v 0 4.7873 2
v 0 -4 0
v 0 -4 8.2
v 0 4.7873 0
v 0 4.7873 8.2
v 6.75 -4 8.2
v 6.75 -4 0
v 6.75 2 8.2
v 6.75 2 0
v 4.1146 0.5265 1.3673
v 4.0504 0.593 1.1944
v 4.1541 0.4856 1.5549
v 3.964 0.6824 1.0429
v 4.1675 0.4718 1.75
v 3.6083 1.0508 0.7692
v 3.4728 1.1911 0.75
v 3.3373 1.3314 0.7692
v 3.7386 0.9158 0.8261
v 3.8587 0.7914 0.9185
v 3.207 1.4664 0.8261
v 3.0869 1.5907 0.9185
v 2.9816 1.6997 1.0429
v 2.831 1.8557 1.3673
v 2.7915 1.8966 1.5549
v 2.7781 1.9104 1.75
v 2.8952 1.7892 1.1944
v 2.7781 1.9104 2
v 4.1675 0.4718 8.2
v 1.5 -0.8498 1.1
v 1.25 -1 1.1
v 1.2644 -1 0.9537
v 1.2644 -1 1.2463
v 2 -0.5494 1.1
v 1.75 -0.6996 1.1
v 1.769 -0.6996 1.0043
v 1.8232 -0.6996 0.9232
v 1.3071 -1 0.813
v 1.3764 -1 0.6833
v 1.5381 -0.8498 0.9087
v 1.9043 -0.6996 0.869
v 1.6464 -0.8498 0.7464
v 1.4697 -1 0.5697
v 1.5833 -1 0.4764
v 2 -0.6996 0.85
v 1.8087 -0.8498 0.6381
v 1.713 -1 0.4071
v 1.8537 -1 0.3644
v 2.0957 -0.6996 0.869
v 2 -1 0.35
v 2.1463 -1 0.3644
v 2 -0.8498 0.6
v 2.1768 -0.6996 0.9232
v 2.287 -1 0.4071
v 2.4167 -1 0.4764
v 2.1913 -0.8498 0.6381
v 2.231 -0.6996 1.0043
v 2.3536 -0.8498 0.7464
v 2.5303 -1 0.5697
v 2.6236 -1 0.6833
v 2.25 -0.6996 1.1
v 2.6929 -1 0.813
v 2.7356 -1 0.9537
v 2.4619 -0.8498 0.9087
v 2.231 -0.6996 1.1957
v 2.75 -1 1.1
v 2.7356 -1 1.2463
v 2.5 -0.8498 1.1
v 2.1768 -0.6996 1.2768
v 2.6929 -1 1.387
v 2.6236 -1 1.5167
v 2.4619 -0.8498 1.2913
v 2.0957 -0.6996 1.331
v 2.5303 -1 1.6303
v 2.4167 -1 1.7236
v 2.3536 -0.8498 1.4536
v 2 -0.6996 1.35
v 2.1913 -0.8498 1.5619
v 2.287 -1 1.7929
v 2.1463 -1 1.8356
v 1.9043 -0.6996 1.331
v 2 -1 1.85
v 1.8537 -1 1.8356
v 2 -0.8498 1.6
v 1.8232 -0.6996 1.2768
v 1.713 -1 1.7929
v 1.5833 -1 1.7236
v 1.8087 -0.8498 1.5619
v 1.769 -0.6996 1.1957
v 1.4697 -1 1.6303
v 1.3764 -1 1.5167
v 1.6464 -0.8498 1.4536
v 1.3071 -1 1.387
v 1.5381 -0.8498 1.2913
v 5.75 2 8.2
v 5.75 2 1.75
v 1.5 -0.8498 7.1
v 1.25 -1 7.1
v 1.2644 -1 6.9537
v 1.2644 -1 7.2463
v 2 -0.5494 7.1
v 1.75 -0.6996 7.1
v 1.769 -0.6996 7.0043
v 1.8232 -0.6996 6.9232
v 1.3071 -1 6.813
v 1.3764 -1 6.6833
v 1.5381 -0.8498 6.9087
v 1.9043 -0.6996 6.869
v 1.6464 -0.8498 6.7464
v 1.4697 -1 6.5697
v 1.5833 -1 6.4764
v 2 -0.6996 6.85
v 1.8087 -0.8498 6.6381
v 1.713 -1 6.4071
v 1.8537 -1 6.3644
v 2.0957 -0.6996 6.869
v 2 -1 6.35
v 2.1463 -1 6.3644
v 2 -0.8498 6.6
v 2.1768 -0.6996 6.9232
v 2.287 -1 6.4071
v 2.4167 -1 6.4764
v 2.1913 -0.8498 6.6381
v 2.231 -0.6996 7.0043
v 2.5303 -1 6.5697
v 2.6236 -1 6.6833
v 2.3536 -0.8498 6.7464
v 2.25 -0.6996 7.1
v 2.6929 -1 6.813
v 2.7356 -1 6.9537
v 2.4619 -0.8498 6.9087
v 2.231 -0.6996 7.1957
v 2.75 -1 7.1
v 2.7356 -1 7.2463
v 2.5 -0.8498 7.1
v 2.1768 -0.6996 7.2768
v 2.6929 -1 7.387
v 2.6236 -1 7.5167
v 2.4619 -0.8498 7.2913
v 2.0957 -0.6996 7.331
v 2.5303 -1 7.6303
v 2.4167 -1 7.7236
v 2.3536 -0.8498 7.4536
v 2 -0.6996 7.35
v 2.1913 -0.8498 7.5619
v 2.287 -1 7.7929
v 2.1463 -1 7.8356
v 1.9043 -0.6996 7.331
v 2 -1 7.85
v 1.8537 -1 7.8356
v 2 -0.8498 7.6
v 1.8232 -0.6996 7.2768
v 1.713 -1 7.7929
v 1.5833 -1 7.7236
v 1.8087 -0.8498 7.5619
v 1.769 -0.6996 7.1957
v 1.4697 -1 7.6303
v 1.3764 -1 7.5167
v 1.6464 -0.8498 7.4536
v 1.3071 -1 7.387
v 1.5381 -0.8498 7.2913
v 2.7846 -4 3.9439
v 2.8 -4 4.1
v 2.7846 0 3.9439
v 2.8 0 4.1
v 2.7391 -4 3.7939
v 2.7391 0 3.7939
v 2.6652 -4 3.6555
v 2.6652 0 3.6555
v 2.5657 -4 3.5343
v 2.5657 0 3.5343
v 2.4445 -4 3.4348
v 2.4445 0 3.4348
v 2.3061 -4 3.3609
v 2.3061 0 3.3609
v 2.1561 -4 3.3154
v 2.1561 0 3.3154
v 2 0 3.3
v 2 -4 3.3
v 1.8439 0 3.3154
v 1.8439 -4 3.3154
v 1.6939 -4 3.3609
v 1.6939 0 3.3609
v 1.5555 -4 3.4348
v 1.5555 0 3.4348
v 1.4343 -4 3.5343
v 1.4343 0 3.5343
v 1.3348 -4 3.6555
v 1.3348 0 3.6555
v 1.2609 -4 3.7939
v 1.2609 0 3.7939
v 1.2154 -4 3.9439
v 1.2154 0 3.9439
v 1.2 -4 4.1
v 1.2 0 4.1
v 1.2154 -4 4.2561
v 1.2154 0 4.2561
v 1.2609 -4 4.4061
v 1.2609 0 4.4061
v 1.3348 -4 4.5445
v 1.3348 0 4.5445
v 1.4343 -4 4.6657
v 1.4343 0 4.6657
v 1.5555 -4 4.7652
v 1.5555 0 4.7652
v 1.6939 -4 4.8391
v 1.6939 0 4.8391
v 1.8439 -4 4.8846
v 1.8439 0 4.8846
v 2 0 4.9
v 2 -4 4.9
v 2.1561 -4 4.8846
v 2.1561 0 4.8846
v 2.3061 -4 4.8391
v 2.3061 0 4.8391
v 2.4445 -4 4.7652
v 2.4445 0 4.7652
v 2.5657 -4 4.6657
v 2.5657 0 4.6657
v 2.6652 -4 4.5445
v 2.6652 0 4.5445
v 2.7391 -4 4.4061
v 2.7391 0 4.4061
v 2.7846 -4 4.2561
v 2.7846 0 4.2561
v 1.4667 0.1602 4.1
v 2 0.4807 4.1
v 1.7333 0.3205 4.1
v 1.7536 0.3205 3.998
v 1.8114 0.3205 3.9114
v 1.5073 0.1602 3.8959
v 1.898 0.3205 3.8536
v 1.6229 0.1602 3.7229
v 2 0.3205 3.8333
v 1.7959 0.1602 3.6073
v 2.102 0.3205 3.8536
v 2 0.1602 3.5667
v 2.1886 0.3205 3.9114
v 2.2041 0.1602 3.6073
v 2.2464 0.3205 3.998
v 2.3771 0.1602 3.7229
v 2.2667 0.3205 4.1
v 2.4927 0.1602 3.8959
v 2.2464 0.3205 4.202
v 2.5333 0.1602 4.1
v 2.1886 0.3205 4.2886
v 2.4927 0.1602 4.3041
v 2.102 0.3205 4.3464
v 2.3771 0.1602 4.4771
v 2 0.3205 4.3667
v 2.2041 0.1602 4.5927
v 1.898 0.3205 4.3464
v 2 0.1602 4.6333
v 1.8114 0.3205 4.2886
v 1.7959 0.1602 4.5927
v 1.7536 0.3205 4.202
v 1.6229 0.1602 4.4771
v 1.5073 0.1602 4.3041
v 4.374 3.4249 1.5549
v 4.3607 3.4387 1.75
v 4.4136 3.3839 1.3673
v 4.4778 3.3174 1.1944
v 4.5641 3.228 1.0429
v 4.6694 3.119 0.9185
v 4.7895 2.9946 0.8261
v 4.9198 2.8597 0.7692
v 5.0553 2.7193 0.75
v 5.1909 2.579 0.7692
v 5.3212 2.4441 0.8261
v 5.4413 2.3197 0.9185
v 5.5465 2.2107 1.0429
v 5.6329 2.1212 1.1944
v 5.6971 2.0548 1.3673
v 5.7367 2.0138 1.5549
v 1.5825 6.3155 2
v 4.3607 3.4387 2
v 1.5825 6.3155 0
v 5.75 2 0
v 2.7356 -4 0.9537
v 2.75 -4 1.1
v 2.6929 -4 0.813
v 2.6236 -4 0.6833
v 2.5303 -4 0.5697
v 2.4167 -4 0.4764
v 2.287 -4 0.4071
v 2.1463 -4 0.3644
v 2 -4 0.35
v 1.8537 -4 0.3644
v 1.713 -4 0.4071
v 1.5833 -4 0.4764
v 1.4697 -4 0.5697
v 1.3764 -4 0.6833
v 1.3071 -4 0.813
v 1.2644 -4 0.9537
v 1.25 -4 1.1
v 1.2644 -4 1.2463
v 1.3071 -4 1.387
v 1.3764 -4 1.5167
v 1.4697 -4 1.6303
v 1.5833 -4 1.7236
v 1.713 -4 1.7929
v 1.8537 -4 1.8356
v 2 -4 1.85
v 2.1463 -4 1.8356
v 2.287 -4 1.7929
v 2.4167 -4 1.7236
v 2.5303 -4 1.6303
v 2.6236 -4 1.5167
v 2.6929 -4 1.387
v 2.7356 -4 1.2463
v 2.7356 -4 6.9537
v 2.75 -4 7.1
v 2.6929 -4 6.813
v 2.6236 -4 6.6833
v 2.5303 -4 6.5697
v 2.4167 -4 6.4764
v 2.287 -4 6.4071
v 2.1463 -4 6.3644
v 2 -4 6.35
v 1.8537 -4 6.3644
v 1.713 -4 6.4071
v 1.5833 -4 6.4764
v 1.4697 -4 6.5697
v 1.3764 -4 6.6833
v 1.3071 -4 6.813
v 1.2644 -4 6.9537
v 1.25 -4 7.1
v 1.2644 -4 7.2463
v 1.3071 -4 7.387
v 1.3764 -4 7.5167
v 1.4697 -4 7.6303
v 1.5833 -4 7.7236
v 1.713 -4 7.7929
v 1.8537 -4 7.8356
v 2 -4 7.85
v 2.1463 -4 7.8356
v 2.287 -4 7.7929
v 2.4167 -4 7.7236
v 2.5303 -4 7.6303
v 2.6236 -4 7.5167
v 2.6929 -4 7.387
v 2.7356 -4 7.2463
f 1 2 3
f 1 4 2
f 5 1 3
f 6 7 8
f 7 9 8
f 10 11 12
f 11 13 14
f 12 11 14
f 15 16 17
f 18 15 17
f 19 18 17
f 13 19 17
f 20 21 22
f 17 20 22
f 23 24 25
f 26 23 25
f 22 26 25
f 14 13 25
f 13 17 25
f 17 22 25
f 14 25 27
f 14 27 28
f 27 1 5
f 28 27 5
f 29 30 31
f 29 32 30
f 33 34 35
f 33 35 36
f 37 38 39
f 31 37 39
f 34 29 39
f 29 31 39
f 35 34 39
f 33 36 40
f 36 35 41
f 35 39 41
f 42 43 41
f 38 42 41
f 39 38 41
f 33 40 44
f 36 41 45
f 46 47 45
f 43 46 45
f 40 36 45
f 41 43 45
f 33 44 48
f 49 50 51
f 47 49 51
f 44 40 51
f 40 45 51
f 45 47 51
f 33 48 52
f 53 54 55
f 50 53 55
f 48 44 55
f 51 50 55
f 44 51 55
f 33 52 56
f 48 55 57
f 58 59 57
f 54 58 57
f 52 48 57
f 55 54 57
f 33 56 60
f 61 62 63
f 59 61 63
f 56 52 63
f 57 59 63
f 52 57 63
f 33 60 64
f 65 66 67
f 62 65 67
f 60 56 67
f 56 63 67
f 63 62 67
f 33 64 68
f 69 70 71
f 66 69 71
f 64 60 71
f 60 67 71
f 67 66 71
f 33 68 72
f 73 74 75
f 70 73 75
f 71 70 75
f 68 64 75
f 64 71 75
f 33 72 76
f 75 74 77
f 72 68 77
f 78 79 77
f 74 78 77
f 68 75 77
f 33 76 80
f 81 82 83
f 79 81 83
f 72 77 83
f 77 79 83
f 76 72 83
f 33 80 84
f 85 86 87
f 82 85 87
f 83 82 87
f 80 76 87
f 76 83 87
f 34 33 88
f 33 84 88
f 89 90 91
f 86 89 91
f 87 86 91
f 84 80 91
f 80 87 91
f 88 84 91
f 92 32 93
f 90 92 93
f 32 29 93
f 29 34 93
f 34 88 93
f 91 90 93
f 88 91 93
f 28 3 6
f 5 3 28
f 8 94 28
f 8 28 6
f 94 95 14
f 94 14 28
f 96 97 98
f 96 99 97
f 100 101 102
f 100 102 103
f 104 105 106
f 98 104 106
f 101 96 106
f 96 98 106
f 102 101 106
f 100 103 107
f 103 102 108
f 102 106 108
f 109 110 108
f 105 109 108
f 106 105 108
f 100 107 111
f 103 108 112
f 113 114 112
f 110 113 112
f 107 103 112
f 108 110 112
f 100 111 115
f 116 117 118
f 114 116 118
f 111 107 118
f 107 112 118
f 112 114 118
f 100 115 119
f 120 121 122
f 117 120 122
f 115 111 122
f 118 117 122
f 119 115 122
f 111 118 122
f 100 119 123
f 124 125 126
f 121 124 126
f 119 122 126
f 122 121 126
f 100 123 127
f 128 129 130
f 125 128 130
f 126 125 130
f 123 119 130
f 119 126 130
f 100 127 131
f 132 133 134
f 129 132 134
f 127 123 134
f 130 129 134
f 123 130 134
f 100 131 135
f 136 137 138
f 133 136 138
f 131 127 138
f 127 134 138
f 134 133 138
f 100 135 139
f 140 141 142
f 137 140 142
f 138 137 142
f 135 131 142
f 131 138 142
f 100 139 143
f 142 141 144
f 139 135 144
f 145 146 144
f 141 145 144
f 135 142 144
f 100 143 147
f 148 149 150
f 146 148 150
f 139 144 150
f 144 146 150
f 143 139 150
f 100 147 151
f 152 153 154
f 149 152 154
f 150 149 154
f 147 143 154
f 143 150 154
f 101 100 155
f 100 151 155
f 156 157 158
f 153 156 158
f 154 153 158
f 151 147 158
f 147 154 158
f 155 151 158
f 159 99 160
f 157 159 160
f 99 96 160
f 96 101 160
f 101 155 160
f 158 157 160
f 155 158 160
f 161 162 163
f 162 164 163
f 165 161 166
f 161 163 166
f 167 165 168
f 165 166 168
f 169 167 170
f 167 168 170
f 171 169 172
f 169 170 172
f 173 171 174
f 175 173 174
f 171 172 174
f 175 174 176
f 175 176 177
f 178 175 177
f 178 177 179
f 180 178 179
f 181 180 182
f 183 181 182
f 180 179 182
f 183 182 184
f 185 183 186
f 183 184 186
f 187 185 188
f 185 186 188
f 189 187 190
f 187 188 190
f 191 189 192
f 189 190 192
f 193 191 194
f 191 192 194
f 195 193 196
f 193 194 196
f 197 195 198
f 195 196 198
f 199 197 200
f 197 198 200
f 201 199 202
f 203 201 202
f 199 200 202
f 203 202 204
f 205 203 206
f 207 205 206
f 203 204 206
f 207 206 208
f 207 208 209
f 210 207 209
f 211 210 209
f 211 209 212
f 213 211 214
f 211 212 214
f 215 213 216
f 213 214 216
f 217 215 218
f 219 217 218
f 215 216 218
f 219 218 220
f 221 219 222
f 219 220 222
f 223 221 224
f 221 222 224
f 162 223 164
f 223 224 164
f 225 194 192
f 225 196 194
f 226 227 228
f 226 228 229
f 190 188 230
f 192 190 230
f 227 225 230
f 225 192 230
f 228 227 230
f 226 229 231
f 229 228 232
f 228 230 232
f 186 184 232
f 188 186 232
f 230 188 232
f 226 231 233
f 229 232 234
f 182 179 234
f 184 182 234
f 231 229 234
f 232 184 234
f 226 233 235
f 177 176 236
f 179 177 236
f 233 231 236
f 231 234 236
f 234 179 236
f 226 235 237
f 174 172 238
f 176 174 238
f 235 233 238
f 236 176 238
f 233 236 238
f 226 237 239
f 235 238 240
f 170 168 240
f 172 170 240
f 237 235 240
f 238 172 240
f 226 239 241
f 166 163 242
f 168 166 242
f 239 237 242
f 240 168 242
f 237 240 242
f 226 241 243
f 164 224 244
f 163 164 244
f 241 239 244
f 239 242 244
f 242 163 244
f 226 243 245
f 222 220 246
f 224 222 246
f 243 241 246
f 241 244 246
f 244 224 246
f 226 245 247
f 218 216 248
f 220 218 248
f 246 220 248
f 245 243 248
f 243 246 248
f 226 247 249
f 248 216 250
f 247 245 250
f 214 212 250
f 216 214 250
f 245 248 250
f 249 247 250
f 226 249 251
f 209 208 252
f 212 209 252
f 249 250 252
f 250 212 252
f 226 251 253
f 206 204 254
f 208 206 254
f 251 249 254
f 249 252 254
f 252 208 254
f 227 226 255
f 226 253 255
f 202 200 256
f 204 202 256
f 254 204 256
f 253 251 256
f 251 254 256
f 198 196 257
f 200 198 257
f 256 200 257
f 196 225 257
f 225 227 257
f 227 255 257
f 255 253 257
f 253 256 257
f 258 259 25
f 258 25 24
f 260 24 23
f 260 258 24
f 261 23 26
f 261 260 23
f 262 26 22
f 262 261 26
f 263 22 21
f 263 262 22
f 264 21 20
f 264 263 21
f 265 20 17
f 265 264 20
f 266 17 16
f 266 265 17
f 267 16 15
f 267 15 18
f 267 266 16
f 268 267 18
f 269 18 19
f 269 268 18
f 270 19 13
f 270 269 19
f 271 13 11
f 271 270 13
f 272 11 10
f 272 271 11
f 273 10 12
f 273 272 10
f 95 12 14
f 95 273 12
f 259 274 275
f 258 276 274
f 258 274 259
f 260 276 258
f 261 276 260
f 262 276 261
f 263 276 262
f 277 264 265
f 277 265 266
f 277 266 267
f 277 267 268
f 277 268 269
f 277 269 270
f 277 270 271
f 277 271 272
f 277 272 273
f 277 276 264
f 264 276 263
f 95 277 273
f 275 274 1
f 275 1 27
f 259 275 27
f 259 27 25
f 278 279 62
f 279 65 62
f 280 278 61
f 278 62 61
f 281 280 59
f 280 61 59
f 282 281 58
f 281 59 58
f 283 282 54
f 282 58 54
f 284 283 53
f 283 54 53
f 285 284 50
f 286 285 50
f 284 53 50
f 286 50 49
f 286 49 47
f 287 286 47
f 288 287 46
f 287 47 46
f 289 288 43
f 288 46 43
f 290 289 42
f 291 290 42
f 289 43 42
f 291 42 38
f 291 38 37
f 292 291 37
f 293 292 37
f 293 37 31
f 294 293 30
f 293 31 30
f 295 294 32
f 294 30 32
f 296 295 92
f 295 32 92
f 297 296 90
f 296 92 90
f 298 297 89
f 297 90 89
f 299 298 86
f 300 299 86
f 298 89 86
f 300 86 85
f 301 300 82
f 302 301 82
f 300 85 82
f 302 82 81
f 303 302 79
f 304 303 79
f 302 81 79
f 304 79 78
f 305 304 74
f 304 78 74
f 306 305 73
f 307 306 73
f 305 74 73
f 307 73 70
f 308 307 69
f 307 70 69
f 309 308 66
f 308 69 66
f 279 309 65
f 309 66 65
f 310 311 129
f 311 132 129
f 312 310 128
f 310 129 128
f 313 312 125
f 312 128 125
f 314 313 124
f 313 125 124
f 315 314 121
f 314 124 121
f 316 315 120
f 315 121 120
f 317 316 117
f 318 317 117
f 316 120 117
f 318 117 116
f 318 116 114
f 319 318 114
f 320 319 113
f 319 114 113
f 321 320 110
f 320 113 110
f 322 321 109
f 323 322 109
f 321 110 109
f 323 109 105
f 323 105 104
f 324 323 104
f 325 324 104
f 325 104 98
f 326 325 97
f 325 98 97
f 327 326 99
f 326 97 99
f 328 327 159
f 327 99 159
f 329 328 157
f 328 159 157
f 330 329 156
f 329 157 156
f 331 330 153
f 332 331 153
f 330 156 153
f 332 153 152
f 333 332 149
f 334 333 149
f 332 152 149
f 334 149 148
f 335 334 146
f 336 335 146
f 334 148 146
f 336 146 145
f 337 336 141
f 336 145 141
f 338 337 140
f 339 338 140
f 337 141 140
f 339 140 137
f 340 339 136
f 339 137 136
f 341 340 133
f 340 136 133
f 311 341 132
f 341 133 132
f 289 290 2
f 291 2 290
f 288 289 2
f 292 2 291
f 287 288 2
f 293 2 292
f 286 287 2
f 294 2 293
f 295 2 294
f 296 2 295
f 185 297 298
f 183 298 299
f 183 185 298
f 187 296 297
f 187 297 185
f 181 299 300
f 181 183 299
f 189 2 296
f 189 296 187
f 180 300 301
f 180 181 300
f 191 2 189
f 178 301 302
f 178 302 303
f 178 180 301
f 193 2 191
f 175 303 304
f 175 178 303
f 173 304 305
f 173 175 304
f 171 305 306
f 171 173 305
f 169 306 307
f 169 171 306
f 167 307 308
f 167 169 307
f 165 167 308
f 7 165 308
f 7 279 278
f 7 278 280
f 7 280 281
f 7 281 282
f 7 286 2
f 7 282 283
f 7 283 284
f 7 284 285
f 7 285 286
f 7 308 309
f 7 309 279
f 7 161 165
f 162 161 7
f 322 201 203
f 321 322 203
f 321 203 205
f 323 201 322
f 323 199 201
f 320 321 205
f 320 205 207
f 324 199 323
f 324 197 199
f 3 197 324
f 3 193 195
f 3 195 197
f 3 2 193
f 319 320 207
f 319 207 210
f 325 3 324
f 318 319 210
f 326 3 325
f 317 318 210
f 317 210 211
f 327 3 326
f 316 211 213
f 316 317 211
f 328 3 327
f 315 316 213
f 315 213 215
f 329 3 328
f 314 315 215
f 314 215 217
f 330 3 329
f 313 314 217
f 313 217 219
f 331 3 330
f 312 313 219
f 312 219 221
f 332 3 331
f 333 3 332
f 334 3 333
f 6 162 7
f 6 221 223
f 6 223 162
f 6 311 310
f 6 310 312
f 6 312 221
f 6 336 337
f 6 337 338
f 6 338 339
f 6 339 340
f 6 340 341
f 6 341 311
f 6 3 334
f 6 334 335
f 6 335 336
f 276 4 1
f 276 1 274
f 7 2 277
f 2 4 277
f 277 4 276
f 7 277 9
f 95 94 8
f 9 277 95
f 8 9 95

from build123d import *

# Parameters (mm, degrees)
BOSS_EXTRUDE1_DEPTH       = 8.2
CUT_EXTRUDE1_DEPTH        = 2.2
SKETCH3_W                 = 6.75
SKETCH3_H                 = 8.2
BOSS_EXTRUDE2_DEPTH       = 4
F_1_5MM_DOWEL_HOLE1_D     = 1.5
F_1_5MM_DOWEL_HOLE1_DEPTH = 3
F_1_5MM_DOWEL_HOLE1_TIP   = 0.450645464
M2X0_4_TAPPED_HOLE1_D     = 1.6
M2X0_4_TAPPED_HOLE1_DEPTH = 4
M2X0_4_TAPPED_HOLE1_TIP   = 0.480688495


with BuildPart() as part:
    # Sketch1 → Boss-Extrude1 (new body)
    with BuildSketch(Plane.XY):
        Polygon((0, 0), (0, 4.787274917), (1.582547561, 6.315523332), (5.75, 2), (6.75, 2), (6.75, 0), align=None)
    extrude(amount=BOSS_EXTRUDE1_DEPTH)

    # Sketch2 → Cut-Extrude1 (cut)
    with BuildSketch(Plane(origin=(3.97472688, 3.838349131, 0), x_dir=(0, 0, -1), z_dir=(0.7193398, 0.69465837, 0))):
        with BuildLine():
            Line((-8.2, 3.443677383), (-2, 3.443677383))
            Line((-2, 3.443677383), (-2, -0.555606029))
            Line((-2, -0.555606029), (-1.75, -0.555606029))
            ThreePointArc((-1.75, -0.555606029), (-0.75, -1.555606029), (-1.75, -2.555606029))
            Line((-1.75, -2.555606029), (-8.2, -2.555606029))
            Line((-8.2, -2.555606029), (-8.2, 3.443677383))
        make_face()
    extrude(amount=-CUT_EXTRUDE1_DEPTH, mode=Mode.SUBTRACT)

    # Sketch3 → Boss-Extrude2 (add)
    with BuildSketch(Plane.XZ):
        with Locations((3.375, 4.1)):
            Rectangle(SKETCH3_W, SKETCH3_H)
    extrude(amount=BOSS_EXTRUDE2_DEPTH)

    # Ø1.5mm Dowel Hole1
    with Locations(Plane(origin=(0, -4, 0), x_dir=(-1, 0, 0), z_dir=(0, -1, 0))):
        with Locations((-2, -7.1), (-2, -1.1)):
            Hole(F_1_5MM_DOWEL_HOLE1_D / 2, depth=F_1_5MM_DOWEL_HOLE1_DEPTH)
            with Locations((0, 0, -(F_1_5MM_DOWEL_HOLE1_DEPTH + F_1_5MM_DOWEL_HOLE1_TIP / 2))):  # 118° drill point
                Cone(0, F_1_5MM_DOWEL_HOLE1_D / 2, F_1_5MM_DOWEL_HOLE1_TIP, mode=Mode.SUBTRACT)

    # M2x0.4 Tapped Hole1
    with Locations(Plane(origin=(0, -4, 0), x_dir=(-1, 0, 0), z_dir=(0, -1, 0))):
        with Locations((-2, -4.1)):
            Hole(M2X0_4_TAPPED_HOLE1_D / 2, depth=M2X0_4_TAPPED_HOLE1_DEPTH)
            with Locations((0, 0, -(M2X0_4_TAPPED_HOLE1_DEPTH + M2X0_4_TAPPED_HOLE1_TIP / 2))):  # 118° drill point
                Cone(0, M2X0_4_TAPPED_HOLE1_D / 2, M2X0_4_TAPPED_HOLE1_TIP, mode=Mode.SUBTRACT)


solid = part.part
